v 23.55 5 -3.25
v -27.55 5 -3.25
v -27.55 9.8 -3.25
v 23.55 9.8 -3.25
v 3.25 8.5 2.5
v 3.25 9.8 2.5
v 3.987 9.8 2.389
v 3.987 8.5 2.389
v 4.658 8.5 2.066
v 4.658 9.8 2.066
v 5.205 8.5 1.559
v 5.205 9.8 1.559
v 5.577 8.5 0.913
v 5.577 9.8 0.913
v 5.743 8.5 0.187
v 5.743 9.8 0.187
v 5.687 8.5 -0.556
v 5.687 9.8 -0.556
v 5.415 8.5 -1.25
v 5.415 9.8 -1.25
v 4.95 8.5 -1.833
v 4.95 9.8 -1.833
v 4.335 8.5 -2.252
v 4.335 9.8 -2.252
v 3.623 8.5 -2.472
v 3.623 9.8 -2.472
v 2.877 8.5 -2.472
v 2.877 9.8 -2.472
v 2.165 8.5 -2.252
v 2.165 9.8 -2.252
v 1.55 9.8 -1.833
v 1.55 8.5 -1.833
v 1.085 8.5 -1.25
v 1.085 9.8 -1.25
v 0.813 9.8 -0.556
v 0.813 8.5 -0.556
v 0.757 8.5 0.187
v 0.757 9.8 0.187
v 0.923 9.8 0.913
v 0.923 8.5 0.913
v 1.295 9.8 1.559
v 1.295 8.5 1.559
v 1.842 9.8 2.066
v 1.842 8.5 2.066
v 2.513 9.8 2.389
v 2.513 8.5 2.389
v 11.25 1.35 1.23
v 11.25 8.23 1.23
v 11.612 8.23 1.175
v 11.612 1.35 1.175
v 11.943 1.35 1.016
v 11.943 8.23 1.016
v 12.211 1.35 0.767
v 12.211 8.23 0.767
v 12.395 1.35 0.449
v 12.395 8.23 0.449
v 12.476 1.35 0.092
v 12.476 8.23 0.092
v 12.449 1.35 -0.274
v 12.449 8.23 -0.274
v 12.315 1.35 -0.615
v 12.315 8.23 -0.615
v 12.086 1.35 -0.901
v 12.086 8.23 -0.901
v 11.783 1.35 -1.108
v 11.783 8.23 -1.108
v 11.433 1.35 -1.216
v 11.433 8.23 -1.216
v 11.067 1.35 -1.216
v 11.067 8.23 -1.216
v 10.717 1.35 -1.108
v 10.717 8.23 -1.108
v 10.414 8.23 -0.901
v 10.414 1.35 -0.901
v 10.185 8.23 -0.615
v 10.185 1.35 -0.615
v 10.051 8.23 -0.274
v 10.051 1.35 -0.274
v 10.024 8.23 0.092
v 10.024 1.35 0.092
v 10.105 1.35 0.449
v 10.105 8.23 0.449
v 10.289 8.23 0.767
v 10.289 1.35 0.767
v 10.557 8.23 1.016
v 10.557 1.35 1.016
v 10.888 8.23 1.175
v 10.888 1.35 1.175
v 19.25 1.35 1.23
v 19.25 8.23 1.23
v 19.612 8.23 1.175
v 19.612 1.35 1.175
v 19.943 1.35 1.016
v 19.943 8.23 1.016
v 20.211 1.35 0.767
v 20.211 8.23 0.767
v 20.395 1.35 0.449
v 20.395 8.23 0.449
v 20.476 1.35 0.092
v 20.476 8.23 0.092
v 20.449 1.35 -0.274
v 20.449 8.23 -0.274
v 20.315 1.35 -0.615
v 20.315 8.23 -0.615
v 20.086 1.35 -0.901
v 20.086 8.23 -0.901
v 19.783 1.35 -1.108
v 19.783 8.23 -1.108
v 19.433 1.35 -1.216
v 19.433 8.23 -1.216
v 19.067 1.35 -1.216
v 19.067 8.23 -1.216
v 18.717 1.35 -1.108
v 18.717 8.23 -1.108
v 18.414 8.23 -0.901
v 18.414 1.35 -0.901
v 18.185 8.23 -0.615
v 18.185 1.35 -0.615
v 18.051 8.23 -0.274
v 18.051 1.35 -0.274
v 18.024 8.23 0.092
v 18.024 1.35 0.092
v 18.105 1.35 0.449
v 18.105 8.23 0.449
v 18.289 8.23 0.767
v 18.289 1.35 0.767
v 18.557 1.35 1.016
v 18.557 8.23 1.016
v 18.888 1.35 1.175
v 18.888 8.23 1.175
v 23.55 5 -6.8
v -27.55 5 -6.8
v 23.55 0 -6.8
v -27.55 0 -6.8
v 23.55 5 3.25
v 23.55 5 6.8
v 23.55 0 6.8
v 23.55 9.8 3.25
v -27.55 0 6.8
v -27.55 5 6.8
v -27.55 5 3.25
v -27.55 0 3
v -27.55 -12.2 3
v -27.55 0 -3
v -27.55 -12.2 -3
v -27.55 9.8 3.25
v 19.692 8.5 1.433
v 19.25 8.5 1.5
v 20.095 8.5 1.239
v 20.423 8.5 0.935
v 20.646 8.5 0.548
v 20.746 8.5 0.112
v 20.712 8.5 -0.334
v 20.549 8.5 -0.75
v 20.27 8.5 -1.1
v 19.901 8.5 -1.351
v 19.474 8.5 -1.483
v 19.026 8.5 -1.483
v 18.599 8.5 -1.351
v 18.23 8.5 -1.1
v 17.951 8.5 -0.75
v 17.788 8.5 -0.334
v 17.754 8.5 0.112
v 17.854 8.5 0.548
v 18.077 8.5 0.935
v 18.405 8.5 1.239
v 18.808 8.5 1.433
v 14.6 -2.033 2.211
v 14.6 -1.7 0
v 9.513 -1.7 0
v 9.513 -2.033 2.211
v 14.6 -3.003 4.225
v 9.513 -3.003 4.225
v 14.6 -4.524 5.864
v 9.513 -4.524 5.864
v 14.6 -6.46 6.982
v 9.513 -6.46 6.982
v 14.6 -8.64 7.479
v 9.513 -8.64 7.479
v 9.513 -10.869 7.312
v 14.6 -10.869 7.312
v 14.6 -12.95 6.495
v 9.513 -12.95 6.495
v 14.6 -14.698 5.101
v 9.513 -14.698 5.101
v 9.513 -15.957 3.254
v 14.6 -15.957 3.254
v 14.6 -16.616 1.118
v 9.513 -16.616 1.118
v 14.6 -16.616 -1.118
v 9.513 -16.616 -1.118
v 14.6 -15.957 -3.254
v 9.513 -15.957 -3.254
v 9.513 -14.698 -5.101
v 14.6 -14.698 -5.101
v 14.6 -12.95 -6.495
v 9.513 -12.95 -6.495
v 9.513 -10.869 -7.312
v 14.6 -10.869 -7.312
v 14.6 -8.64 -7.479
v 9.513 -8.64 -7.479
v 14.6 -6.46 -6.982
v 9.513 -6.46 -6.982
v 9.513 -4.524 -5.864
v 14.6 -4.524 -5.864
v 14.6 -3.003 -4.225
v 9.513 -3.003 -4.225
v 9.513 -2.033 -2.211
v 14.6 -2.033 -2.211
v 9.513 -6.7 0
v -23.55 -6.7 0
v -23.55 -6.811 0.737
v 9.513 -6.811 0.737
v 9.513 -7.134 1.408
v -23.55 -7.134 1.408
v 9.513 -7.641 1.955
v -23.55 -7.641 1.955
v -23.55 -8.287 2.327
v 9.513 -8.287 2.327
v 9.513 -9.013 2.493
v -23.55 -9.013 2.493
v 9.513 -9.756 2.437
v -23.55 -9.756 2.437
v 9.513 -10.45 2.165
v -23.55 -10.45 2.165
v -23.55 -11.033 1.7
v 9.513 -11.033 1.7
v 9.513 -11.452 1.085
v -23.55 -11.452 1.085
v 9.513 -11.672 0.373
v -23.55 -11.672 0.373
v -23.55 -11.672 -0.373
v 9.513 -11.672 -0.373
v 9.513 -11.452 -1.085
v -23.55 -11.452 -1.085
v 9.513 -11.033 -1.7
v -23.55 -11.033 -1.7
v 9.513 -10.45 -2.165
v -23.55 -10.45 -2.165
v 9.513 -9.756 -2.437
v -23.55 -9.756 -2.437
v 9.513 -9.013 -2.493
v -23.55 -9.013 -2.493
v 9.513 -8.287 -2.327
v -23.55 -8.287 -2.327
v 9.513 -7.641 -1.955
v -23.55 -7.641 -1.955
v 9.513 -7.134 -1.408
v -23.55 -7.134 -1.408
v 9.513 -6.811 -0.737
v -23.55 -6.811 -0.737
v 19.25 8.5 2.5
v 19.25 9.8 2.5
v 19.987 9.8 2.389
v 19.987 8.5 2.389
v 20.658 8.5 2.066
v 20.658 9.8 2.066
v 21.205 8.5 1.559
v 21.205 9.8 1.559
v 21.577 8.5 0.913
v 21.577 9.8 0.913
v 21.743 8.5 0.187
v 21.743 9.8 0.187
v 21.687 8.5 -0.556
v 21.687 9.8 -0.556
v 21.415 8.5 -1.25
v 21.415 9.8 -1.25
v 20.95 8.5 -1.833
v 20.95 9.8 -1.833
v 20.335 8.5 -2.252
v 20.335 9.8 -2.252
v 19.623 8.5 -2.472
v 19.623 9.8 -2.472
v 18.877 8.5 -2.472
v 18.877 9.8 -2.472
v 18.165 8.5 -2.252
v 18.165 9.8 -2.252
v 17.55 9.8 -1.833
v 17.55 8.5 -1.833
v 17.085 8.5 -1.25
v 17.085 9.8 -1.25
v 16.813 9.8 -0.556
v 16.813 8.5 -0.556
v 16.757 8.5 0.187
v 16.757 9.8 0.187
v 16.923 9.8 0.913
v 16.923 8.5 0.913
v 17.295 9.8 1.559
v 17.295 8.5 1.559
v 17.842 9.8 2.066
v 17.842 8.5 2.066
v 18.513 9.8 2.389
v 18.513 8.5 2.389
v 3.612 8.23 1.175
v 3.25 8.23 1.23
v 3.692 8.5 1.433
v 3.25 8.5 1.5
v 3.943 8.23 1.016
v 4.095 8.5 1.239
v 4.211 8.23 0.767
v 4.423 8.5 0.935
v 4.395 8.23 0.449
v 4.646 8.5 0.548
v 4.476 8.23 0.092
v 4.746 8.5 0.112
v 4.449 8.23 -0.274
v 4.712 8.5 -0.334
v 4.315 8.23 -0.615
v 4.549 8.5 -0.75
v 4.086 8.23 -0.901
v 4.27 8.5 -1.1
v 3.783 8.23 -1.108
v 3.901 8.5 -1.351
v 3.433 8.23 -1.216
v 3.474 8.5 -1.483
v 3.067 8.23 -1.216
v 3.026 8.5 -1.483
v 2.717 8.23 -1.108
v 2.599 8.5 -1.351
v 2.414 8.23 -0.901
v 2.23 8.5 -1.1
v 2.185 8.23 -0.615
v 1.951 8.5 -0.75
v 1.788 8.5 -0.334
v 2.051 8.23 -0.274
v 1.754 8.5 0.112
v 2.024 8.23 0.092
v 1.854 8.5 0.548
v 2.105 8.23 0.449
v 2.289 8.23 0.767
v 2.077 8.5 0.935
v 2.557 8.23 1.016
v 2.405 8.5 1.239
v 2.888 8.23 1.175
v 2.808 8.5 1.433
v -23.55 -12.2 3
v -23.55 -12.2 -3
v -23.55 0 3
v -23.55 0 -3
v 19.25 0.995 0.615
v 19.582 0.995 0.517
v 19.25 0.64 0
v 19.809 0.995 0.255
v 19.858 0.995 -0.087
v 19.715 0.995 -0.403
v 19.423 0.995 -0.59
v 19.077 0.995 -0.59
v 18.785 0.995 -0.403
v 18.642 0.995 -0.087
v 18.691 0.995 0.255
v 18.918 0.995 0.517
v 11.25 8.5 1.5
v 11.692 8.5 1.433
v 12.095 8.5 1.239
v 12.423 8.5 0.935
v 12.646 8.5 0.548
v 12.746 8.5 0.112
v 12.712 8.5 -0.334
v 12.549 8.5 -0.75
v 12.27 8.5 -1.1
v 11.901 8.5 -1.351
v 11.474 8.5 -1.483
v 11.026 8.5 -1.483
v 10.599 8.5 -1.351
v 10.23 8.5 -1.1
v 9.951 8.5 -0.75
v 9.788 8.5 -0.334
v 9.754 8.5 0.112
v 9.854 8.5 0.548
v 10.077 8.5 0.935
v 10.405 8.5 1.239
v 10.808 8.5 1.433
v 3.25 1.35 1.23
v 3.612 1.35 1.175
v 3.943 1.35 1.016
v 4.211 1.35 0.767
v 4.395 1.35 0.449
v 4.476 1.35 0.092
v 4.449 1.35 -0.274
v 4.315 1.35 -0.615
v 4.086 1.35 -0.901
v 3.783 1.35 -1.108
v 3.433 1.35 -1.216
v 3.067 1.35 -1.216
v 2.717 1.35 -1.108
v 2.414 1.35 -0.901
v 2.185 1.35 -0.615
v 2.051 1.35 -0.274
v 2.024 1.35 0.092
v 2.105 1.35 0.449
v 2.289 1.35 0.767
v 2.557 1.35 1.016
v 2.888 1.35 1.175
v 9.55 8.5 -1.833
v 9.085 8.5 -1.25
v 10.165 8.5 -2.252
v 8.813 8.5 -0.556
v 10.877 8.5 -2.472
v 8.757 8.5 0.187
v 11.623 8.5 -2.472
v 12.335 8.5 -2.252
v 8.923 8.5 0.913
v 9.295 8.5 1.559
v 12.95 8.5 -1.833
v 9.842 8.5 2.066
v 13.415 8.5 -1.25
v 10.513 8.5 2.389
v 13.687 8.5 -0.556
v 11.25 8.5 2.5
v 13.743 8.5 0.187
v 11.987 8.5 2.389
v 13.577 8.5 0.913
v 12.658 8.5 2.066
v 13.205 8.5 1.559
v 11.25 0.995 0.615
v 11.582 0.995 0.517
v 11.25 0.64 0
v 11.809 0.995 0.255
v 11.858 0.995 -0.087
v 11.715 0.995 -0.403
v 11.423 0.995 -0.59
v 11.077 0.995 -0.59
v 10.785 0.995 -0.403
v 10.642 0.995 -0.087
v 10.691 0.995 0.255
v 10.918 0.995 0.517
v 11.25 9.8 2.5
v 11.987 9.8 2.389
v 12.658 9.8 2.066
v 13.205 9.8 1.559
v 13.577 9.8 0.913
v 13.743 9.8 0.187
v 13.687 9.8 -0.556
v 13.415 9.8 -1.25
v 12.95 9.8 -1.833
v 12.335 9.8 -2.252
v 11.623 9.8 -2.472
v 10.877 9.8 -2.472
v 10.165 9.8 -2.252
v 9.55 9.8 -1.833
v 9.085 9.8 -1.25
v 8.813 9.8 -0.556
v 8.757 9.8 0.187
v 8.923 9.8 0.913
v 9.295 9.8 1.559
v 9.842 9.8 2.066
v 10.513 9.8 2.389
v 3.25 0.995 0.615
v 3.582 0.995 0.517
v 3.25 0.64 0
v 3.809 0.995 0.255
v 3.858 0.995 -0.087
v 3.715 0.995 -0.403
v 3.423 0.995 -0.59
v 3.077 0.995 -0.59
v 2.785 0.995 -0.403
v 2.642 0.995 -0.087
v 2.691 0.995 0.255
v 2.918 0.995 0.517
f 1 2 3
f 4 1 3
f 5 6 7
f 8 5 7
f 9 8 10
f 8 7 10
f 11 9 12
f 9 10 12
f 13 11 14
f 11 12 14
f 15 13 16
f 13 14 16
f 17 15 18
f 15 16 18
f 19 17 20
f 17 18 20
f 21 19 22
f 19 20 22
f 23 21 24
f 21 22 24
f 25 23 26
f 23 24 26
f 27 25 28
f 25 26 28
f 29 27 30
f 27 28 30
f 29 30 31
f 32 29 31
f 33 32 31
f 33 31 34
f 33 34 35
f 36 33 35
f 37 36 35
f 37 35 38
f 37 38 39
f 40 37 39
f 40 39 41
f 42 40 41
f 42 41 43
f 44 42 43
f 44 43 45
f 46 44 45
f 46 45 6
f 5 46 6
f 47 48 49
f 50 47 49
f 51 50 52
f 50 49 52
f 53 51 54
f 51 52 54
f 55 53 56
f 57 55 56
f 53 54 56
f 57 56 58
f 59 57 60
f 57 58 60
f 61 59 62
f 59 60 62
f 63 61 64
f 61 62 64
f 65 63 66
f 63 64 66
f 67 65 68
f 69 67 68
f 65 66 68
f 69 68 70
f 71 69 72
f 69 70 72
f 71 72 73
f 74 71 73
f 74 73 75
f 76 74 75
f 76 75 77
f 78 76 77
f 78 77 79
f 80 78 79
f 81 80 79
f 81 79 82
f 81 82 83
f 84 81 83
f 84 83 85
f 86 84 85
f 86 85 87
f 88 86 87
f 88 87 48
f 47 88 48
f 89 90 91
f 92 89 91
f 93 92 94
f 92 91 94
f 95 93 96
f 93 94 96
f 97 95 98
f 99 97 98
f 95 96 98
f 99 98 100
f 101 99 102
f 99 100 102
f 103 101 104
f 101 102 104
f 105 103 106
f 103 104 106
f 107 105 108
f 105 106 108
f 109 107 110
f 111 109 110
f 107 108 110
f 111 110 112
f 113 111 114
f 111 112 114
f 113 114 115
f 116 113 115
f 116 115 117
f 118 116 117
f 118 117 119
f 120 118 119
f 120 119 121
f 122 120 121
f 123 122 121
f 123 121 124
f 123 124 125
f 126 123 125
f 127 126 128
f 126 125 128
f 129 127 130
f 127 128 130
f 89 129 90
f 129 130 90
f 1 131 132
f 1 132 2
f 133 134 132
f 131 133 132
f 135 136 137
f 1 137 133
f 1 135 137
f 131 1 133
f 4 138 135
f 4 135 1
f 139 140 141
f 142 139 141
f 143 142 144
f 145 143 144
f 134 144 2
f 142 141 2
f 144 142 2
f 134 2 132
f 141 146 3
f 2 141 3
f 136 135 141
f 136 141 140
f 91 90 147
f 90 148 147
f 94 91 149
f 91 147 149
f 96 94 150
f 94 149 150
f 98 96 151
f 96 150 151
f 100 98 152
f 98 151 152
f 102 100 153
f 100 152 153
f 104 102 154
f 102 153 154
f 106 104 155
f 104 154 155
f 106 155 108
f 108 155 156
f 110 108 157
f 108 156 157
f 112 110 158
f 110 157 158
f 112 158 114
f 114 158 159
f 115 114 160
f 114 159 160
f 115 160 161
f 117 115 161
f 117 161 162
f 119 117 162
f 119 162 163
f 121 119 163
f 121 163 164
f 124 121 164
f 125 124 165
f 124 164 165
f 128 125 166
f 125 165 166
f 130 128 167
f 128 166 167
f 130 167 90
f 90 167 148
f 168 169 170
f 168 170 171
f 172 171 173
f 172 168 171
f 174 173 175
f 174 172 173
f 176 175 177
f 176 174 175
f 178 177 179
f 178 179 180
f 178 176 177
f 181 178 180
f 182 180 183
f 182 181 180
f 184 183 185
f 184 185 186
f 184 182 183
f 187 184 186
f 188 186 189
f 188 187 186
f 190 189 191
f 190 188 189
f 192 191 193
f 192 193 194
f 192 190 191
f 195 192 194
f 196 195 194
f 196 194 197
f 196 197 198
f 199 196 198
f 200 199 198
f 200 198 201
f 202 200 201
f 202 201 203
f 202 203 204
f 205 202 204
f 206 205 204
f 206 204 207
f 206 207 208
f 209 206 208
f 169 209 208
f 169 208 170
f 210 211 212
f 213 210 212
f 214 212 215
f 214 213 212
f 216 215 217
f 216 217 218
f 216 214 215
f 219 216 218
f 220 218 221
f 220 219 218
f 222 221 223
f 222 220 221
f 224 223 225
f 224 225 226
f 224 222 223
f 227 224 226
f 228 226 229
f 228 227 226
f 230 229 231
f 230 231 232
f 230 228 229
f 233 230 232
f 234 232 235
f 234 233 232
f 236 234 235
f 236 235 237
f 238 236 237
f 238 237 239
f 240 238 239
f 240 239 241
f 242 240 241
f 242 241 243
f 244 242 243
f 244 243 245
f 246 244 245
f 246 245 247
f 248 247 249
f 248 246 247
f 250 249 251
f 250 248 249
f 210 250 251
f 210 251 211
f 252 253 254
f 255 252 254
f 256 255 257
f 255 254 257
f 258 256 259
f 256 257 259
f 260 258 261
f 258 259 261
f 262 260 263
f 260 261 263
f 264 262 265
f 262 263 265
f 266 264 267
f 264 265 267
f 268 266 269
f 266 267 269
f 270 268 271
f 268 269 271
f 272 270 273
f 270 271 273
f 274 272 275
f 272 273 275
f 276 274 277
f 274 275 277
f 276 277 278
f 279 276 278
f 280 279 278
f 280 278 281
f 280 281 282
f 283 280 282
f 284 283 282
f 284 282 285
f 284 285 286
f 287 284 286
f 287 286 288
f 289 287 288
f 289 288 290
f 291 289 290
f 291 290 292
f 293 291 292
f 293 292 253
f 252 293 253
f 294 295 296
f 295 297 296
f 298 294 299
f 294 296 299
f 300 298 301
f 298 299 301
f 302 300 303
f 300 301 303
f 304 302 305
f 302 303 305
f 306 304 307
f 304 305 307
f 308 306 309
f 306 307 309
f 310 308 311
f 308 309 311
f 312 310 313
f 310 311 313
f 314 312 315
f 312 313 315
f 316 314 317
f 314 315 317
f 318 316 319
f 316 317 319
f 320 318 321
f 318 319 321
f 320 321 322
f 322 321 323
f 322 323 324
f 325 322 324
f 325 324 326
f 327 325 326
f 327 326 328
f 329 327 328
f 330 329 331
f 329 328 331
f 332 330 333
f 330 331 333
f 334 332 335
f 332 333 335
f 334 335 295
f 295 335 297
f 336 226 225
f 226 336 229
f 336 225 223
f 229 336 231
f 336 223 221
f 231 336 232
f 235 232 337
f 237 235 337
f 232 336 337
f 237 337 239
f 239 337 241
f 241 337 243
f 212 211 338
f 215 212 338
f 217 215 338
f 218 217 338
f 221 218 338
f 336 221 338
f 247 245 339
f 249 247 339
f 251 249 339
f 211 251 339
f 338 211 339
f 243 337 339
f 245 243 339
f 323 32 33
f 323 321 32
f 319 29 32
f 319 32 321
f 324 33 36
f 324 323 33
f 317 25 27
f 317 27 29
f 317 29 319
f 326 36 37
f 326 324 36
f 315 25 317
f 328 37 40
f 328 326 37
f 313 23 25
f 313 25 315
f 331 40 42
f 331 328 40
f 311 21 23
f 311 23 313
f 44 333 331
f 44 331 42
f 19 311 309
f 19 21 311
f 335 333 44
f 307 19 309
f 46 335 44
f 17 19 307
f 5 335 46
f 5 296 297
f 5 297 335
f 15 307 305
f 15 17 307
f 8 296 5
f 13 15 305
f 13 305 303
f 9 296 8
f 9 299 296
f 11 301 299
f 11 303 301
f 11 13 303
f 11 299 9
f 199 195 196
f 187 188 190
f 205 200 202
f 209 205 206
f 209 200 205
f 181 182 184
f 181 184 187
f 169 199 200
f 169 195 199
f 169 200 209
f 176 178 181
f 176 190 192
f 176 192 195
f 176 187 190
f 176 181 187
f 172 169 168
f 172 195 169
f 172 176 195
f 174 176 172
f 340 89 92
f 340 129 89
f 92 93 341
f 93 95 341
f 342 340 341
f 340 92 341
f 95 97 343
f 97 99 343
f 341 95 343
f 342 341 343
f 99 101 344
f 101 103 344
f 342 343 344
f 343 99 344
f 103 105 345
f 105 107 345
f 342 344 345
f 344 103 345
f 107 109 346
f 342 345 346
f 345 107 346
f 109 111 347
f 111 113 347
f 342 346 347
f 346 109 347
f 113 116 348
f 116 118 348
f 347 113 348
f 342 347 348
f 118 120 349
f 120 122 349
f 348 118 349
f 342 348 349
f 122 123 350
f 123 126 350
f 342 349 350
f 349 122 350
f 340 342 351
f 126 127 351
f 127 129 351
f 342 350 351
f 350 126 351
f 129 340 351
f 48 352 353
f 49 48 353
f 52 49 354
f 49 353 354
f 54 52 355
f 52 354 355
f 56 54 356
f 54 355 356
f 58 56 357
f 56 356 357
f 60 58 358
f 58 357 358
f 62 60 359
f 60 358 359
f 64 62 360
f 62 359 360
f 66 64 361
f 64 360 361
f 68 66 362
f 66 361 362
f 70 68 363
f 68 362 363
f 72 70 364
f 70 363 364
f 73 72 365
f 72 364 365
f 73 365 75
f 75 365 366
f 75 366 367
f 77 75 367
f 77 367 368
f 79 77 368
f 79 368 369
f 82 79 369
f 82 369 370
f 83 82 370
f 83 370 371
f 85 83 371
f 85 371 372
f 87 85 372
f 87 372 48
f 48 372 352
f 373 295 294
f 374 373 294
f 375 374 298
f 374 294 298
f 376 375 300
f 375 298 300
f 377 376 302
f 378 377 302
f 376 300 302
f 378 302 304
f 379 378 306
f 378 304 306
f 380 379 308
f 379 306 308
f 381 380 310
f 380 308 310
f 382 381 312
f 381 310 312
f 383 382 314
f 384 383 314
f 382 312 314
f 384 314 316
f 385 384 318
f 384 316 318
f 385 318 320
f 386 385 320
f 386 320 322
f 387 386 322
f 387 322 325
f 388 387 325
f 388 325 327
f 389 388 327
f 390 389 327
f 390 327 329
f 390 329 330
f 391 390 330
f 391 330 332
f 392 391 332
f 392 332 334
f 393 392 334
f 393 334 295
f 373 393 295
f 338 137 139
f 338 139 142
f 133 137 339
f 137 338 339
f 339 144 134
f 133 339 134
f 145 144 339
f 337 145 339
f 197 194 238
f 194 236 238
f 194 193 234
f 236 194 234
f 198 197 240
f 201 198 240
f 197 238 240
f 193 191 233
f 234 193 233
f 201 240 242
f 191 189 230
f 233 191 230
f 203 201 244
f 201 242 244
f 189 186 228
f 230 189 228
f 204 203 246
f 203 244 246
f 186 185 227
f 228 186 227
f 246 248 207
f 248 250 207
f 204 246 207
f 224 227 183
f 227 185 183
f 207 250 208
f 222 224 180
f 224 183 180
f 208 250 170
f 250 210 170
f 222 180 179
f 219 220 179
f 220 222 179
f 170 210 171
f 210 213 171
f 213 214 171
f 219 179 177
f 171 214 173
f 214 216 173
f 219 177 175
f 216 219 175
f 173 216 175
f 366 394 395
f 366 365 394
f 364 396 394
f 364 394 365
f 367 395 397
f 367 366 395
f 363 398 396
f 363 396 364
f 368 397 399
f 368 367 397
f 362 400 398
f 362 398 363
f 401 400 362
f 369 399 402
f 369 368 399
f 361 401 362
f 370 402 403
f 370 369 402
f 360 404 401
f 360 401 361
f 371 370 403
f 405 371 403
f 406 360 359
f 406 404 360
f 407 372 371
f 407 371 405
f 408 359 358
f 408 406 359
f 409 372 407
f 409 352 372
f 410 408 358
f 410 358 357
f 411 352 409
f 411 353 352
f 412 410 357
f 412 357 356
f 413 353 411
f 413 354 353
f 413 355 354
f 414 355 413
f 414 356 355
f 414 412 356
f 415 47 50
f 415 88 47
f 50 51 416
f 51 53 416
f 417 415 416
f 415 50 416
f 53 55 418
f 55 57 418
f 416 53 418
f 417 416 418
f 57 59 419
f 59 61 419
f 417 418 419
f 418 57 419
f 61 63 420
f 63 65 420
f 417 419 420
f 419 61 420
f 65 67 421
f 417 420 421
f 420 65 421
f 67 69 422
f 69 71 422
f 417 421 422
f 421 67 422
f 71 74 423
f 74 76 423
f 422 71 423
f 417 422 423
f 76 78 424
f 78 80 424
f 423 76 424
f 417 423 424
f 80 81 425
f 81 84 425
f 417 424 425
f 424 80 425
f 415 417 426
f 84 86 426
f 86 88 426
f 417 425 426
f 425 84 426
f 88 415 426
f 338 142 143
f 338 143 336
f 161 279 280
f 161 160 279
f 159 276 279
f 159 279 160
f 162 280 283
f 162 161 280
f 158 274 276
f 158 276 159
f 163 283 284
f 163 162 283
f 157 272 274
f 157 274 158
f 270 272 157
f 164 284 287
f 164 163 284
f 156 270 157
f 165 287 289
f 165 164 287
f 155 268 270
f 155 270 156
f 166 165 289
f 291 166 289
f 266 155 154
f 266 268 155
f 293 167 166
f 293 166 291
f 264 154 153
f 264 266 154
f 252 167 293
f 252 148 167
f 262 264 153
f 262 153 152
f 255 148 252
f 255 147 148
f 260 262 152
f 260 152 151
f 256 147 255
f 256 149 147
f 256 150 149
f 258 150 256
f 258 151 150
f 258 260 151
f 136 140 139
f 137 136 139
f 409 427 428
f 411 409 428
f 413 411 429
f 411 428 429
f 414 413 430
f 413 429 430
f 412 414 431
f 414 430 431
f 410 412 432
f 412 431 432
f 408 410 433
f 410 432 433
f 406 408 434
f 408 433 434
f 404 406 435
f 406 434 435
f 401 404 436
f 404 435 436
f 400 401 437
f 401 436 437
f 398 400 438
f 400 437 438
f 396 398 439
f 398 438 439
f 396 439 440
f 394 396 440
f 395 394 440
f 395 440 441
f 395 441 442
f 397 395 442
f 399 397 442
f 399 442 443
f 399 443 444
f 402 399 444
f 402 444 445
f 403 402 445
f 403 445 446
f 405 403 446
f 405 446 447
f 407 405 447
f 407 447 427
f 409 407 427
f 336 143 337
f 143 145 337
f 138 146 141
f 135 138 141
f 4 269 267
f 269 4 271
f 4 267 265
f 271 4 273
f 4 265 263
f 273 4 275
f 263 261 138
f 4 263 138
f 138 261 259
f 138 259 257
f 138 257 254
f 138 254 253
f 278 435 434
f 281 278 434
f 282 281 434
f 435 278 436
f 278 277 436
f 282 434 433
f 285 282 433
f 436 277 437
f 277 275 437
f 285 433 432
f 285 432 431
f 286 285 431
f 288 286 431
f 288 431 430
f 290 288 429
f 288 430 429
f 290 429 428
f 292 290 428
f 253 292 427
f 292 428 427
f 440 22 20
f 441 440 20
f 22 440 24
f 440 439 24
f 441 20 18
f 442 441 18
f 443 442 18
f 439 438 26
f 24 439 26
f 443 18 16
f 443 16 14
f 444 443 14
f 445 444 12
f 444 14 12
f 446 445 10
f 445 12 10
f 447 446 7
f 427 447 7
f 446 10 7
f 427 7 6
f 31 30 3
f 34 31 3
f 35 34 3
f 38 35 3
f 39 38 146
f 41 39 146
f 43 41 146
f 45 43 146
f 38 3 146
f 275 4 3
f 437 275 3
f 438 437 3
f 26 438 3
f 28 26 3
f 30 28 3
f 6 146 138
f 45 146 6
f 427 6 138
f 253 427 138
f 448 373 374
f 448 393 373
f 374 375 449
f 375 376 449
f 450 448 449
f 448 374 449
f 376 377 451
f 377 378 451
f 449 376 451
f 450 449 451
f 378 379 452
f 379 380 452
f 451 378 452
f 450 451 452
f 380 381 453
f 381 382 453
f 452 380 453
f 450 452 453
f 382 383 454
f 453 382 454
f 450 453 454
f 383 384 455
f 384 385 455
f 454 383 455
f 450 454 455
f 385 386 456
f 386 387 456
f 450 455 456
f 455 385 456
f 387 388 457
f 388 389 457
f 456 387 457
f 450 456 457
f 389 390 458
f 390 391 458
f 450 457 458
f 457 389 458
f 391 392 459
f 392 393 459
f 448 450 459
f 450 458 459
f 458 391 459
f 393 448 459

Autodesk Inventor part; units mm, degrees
sketch "Skizze_1" plane through (-27.55, 0, 0) normal (1, 0, 0) x (0, 0, -1)
  line L0 (-6.8, 5) -> (-6.8, 0)
  line L1 (-6.8, 0) -> (6.8, 0)
  line L2 (6.8, 0) -> (6.8, 5)
  line L3 (6.8, 5) -> (3.25, 5)
  line L4 (3.25, 5) -> (3.25, 9.8)
  line L5 (3.25, 9.8) -> (-3.25, 9.8)
  line L6 (-3.25, 9.8) -> (-3.25, 5)
  line L7 (-3.25, 5) -> (-6.8, 5)
extrude "Extrusion1" add sketch "Skizze_1" along normal blind 51.1
sketch "Skizze_2" plane through (0, 0, 0) normal (0, 0, 1) x (1, 0, 0)
  line L0 (-27.55, 7) -> (-27.55, -12.2)
  line L1 (-27.55, -12.2) -> (-23.55, -12.2)
  line L2 (-23.55, -12.2) -> (-23.55, 7)
  line L3 (-23.55, 7) -> (-27.55, 7)
extrude "Extrusion2" add sketch "Skizze_2" along normal mid plane 6
sketch "Sketch_1" plane through (0, 0, 0) normal (0, 0, 1) x (1, 0, 0)
  line L0 (14.6, -9.2) -> (-23.55, -9.2)
  line L1 (-23.55, -9.2) -> (-23.55, -6.7)
  line L2 (-23.55, -6.7) -> (9.5133, -6.7)
  line L3 (9.5133, -6.7) -> (9.5133, -1.7)
  line L4 (9.5133, -1.7) -> (14.6, -1.7)
  line L5 (14.6, -1.7) -> (14.6, -9.2)
  line L6 (14.6, -9.2) -> (-23.55, -9.2)
revolve "Revolution1" add sketch "Sketch_1" angle 360 about axis through (14.6, -9.2, 0) along (1, 0, 0)
sketch "Sketch_3" plane through (19.25, 0, 0) normal (1, 0, 0) x (0, 0, -1)
  line L0 (0, 9.8) -> (0, 0.6401)
  line L1 (0, 0.6401) -> (-1.2295, 1.35)
  line L2 (-1.2295, 1.35) -> (-1.2295, 8.2295)
  line L3 (-1.2295, 8.2295) -> (-1.5, 8.5)
  line L4 (-1.5, 8.5) -> (-2.5, 8.5)
  line L5 (-2.5, 8.5) -> (-2.5, 9.8)
  line L6 (-2.5, 9.8) -> (0, 9.8)
  line L7 (0, 9.8) -> (0, 0.6401)
revolve "Revolution2" cut sketch "Sketch_3" angle 360 about axis through (19.25, 9.8, 0) along (0, 1, 0)
thread "Thread1" size "M3x0.5" class "6H" standard "ISO Metric profile" length 5.2295
pattern_linear "Rectangular Pattern1" count 3 spacing 8 along (-1, 0, 0) of "Revolution2"
ref_plane "ANBAU_XY" through (14.6, -9.2, 0) normal (1, 0, 0) x (0, 0, -1)
ref_plane "ANBAU_YZ" through (14.6, -9.2, 0) normal (0, 0, -1) x (0, 1, 0)
ref_plane "ANBAU_ZX" through (14.6, -9.2, 0) normal (0, 1, 0) x (1, 0, 0)
ref_plane "SCHRAUBE_1_XY" through (19.25, 8.5, 0) normal (0, 1, 0) x (1, 0, 0)
ref_plane "SCHRAUBE_1_YZ" through (19.25, 8.5, 0) normal (1, 0, 0) x (0, 0, -1)
ref_plane "SCHRAUBE_1_ZX" through (19.25, 8.5, 0) normal (0, 0, -1) x (0, 1, 0)
ref_plane "SCHRAUBE_2_XY" through (11.25, 8.5, 0) normal (0, 1, 0) x (1, 0, 0)
ref_plane "SCHRAUBE_2_YZ" through (11.25, 8.5, 0) normal (1, 0, 0) x (0, 0, -1)
ref_plane "SCHRAUBE_2_ZX" through (11.25, 8.5, 0) normal (0, 0, -1) x (0, 1, 0)
ref_plane "SCHRAUBE_3_XY" through (3.25, 8.5, 0) normal (0, 1, 0) x (1, 0, 0)
ref_plane "SCHRAUBE_3_YZ" through (3.25, 8.5, 0) normal (1, 0, 0) x (0, 0, -1)
ref_plane "SCHRAUBE_3_ZX" through (3.25, 8.5, 0) normal (0, 0, -1) x (0, 1, 0)
ref_plane "ZBHJAW1_XY" through (19.25, 8.5, 0) normal (0, -1, 0) x (1, 0, 0)
ref_plane "ZBHJAW1_YZ" through (19.25, 8.5, 0) normal (1, 0, 0) x (0, 0, 1)
ref_plane "ZBHJAW1_ZX" through (19.25, 8.5, 0) normal (0, 0, 1) x (0, -1, 0)
ref_plane "ZBHJAW2_XY" through (3.25, 8.5, 0) normal (0, -1, 0) x (1, 0, 0)
ref_plane "ZBHJAW2_YZ" through (3.25, 8.5, 0) normal (1, 0, 0) x (0, 0, 1)
ref_plane "ZBHJAW2_ZX" through (3.25, 8.5, 0) normal (0, 0, 1) x (0, -1, 0)
properties part number "3361610 HGPL-BAC-14-20---(J)"
